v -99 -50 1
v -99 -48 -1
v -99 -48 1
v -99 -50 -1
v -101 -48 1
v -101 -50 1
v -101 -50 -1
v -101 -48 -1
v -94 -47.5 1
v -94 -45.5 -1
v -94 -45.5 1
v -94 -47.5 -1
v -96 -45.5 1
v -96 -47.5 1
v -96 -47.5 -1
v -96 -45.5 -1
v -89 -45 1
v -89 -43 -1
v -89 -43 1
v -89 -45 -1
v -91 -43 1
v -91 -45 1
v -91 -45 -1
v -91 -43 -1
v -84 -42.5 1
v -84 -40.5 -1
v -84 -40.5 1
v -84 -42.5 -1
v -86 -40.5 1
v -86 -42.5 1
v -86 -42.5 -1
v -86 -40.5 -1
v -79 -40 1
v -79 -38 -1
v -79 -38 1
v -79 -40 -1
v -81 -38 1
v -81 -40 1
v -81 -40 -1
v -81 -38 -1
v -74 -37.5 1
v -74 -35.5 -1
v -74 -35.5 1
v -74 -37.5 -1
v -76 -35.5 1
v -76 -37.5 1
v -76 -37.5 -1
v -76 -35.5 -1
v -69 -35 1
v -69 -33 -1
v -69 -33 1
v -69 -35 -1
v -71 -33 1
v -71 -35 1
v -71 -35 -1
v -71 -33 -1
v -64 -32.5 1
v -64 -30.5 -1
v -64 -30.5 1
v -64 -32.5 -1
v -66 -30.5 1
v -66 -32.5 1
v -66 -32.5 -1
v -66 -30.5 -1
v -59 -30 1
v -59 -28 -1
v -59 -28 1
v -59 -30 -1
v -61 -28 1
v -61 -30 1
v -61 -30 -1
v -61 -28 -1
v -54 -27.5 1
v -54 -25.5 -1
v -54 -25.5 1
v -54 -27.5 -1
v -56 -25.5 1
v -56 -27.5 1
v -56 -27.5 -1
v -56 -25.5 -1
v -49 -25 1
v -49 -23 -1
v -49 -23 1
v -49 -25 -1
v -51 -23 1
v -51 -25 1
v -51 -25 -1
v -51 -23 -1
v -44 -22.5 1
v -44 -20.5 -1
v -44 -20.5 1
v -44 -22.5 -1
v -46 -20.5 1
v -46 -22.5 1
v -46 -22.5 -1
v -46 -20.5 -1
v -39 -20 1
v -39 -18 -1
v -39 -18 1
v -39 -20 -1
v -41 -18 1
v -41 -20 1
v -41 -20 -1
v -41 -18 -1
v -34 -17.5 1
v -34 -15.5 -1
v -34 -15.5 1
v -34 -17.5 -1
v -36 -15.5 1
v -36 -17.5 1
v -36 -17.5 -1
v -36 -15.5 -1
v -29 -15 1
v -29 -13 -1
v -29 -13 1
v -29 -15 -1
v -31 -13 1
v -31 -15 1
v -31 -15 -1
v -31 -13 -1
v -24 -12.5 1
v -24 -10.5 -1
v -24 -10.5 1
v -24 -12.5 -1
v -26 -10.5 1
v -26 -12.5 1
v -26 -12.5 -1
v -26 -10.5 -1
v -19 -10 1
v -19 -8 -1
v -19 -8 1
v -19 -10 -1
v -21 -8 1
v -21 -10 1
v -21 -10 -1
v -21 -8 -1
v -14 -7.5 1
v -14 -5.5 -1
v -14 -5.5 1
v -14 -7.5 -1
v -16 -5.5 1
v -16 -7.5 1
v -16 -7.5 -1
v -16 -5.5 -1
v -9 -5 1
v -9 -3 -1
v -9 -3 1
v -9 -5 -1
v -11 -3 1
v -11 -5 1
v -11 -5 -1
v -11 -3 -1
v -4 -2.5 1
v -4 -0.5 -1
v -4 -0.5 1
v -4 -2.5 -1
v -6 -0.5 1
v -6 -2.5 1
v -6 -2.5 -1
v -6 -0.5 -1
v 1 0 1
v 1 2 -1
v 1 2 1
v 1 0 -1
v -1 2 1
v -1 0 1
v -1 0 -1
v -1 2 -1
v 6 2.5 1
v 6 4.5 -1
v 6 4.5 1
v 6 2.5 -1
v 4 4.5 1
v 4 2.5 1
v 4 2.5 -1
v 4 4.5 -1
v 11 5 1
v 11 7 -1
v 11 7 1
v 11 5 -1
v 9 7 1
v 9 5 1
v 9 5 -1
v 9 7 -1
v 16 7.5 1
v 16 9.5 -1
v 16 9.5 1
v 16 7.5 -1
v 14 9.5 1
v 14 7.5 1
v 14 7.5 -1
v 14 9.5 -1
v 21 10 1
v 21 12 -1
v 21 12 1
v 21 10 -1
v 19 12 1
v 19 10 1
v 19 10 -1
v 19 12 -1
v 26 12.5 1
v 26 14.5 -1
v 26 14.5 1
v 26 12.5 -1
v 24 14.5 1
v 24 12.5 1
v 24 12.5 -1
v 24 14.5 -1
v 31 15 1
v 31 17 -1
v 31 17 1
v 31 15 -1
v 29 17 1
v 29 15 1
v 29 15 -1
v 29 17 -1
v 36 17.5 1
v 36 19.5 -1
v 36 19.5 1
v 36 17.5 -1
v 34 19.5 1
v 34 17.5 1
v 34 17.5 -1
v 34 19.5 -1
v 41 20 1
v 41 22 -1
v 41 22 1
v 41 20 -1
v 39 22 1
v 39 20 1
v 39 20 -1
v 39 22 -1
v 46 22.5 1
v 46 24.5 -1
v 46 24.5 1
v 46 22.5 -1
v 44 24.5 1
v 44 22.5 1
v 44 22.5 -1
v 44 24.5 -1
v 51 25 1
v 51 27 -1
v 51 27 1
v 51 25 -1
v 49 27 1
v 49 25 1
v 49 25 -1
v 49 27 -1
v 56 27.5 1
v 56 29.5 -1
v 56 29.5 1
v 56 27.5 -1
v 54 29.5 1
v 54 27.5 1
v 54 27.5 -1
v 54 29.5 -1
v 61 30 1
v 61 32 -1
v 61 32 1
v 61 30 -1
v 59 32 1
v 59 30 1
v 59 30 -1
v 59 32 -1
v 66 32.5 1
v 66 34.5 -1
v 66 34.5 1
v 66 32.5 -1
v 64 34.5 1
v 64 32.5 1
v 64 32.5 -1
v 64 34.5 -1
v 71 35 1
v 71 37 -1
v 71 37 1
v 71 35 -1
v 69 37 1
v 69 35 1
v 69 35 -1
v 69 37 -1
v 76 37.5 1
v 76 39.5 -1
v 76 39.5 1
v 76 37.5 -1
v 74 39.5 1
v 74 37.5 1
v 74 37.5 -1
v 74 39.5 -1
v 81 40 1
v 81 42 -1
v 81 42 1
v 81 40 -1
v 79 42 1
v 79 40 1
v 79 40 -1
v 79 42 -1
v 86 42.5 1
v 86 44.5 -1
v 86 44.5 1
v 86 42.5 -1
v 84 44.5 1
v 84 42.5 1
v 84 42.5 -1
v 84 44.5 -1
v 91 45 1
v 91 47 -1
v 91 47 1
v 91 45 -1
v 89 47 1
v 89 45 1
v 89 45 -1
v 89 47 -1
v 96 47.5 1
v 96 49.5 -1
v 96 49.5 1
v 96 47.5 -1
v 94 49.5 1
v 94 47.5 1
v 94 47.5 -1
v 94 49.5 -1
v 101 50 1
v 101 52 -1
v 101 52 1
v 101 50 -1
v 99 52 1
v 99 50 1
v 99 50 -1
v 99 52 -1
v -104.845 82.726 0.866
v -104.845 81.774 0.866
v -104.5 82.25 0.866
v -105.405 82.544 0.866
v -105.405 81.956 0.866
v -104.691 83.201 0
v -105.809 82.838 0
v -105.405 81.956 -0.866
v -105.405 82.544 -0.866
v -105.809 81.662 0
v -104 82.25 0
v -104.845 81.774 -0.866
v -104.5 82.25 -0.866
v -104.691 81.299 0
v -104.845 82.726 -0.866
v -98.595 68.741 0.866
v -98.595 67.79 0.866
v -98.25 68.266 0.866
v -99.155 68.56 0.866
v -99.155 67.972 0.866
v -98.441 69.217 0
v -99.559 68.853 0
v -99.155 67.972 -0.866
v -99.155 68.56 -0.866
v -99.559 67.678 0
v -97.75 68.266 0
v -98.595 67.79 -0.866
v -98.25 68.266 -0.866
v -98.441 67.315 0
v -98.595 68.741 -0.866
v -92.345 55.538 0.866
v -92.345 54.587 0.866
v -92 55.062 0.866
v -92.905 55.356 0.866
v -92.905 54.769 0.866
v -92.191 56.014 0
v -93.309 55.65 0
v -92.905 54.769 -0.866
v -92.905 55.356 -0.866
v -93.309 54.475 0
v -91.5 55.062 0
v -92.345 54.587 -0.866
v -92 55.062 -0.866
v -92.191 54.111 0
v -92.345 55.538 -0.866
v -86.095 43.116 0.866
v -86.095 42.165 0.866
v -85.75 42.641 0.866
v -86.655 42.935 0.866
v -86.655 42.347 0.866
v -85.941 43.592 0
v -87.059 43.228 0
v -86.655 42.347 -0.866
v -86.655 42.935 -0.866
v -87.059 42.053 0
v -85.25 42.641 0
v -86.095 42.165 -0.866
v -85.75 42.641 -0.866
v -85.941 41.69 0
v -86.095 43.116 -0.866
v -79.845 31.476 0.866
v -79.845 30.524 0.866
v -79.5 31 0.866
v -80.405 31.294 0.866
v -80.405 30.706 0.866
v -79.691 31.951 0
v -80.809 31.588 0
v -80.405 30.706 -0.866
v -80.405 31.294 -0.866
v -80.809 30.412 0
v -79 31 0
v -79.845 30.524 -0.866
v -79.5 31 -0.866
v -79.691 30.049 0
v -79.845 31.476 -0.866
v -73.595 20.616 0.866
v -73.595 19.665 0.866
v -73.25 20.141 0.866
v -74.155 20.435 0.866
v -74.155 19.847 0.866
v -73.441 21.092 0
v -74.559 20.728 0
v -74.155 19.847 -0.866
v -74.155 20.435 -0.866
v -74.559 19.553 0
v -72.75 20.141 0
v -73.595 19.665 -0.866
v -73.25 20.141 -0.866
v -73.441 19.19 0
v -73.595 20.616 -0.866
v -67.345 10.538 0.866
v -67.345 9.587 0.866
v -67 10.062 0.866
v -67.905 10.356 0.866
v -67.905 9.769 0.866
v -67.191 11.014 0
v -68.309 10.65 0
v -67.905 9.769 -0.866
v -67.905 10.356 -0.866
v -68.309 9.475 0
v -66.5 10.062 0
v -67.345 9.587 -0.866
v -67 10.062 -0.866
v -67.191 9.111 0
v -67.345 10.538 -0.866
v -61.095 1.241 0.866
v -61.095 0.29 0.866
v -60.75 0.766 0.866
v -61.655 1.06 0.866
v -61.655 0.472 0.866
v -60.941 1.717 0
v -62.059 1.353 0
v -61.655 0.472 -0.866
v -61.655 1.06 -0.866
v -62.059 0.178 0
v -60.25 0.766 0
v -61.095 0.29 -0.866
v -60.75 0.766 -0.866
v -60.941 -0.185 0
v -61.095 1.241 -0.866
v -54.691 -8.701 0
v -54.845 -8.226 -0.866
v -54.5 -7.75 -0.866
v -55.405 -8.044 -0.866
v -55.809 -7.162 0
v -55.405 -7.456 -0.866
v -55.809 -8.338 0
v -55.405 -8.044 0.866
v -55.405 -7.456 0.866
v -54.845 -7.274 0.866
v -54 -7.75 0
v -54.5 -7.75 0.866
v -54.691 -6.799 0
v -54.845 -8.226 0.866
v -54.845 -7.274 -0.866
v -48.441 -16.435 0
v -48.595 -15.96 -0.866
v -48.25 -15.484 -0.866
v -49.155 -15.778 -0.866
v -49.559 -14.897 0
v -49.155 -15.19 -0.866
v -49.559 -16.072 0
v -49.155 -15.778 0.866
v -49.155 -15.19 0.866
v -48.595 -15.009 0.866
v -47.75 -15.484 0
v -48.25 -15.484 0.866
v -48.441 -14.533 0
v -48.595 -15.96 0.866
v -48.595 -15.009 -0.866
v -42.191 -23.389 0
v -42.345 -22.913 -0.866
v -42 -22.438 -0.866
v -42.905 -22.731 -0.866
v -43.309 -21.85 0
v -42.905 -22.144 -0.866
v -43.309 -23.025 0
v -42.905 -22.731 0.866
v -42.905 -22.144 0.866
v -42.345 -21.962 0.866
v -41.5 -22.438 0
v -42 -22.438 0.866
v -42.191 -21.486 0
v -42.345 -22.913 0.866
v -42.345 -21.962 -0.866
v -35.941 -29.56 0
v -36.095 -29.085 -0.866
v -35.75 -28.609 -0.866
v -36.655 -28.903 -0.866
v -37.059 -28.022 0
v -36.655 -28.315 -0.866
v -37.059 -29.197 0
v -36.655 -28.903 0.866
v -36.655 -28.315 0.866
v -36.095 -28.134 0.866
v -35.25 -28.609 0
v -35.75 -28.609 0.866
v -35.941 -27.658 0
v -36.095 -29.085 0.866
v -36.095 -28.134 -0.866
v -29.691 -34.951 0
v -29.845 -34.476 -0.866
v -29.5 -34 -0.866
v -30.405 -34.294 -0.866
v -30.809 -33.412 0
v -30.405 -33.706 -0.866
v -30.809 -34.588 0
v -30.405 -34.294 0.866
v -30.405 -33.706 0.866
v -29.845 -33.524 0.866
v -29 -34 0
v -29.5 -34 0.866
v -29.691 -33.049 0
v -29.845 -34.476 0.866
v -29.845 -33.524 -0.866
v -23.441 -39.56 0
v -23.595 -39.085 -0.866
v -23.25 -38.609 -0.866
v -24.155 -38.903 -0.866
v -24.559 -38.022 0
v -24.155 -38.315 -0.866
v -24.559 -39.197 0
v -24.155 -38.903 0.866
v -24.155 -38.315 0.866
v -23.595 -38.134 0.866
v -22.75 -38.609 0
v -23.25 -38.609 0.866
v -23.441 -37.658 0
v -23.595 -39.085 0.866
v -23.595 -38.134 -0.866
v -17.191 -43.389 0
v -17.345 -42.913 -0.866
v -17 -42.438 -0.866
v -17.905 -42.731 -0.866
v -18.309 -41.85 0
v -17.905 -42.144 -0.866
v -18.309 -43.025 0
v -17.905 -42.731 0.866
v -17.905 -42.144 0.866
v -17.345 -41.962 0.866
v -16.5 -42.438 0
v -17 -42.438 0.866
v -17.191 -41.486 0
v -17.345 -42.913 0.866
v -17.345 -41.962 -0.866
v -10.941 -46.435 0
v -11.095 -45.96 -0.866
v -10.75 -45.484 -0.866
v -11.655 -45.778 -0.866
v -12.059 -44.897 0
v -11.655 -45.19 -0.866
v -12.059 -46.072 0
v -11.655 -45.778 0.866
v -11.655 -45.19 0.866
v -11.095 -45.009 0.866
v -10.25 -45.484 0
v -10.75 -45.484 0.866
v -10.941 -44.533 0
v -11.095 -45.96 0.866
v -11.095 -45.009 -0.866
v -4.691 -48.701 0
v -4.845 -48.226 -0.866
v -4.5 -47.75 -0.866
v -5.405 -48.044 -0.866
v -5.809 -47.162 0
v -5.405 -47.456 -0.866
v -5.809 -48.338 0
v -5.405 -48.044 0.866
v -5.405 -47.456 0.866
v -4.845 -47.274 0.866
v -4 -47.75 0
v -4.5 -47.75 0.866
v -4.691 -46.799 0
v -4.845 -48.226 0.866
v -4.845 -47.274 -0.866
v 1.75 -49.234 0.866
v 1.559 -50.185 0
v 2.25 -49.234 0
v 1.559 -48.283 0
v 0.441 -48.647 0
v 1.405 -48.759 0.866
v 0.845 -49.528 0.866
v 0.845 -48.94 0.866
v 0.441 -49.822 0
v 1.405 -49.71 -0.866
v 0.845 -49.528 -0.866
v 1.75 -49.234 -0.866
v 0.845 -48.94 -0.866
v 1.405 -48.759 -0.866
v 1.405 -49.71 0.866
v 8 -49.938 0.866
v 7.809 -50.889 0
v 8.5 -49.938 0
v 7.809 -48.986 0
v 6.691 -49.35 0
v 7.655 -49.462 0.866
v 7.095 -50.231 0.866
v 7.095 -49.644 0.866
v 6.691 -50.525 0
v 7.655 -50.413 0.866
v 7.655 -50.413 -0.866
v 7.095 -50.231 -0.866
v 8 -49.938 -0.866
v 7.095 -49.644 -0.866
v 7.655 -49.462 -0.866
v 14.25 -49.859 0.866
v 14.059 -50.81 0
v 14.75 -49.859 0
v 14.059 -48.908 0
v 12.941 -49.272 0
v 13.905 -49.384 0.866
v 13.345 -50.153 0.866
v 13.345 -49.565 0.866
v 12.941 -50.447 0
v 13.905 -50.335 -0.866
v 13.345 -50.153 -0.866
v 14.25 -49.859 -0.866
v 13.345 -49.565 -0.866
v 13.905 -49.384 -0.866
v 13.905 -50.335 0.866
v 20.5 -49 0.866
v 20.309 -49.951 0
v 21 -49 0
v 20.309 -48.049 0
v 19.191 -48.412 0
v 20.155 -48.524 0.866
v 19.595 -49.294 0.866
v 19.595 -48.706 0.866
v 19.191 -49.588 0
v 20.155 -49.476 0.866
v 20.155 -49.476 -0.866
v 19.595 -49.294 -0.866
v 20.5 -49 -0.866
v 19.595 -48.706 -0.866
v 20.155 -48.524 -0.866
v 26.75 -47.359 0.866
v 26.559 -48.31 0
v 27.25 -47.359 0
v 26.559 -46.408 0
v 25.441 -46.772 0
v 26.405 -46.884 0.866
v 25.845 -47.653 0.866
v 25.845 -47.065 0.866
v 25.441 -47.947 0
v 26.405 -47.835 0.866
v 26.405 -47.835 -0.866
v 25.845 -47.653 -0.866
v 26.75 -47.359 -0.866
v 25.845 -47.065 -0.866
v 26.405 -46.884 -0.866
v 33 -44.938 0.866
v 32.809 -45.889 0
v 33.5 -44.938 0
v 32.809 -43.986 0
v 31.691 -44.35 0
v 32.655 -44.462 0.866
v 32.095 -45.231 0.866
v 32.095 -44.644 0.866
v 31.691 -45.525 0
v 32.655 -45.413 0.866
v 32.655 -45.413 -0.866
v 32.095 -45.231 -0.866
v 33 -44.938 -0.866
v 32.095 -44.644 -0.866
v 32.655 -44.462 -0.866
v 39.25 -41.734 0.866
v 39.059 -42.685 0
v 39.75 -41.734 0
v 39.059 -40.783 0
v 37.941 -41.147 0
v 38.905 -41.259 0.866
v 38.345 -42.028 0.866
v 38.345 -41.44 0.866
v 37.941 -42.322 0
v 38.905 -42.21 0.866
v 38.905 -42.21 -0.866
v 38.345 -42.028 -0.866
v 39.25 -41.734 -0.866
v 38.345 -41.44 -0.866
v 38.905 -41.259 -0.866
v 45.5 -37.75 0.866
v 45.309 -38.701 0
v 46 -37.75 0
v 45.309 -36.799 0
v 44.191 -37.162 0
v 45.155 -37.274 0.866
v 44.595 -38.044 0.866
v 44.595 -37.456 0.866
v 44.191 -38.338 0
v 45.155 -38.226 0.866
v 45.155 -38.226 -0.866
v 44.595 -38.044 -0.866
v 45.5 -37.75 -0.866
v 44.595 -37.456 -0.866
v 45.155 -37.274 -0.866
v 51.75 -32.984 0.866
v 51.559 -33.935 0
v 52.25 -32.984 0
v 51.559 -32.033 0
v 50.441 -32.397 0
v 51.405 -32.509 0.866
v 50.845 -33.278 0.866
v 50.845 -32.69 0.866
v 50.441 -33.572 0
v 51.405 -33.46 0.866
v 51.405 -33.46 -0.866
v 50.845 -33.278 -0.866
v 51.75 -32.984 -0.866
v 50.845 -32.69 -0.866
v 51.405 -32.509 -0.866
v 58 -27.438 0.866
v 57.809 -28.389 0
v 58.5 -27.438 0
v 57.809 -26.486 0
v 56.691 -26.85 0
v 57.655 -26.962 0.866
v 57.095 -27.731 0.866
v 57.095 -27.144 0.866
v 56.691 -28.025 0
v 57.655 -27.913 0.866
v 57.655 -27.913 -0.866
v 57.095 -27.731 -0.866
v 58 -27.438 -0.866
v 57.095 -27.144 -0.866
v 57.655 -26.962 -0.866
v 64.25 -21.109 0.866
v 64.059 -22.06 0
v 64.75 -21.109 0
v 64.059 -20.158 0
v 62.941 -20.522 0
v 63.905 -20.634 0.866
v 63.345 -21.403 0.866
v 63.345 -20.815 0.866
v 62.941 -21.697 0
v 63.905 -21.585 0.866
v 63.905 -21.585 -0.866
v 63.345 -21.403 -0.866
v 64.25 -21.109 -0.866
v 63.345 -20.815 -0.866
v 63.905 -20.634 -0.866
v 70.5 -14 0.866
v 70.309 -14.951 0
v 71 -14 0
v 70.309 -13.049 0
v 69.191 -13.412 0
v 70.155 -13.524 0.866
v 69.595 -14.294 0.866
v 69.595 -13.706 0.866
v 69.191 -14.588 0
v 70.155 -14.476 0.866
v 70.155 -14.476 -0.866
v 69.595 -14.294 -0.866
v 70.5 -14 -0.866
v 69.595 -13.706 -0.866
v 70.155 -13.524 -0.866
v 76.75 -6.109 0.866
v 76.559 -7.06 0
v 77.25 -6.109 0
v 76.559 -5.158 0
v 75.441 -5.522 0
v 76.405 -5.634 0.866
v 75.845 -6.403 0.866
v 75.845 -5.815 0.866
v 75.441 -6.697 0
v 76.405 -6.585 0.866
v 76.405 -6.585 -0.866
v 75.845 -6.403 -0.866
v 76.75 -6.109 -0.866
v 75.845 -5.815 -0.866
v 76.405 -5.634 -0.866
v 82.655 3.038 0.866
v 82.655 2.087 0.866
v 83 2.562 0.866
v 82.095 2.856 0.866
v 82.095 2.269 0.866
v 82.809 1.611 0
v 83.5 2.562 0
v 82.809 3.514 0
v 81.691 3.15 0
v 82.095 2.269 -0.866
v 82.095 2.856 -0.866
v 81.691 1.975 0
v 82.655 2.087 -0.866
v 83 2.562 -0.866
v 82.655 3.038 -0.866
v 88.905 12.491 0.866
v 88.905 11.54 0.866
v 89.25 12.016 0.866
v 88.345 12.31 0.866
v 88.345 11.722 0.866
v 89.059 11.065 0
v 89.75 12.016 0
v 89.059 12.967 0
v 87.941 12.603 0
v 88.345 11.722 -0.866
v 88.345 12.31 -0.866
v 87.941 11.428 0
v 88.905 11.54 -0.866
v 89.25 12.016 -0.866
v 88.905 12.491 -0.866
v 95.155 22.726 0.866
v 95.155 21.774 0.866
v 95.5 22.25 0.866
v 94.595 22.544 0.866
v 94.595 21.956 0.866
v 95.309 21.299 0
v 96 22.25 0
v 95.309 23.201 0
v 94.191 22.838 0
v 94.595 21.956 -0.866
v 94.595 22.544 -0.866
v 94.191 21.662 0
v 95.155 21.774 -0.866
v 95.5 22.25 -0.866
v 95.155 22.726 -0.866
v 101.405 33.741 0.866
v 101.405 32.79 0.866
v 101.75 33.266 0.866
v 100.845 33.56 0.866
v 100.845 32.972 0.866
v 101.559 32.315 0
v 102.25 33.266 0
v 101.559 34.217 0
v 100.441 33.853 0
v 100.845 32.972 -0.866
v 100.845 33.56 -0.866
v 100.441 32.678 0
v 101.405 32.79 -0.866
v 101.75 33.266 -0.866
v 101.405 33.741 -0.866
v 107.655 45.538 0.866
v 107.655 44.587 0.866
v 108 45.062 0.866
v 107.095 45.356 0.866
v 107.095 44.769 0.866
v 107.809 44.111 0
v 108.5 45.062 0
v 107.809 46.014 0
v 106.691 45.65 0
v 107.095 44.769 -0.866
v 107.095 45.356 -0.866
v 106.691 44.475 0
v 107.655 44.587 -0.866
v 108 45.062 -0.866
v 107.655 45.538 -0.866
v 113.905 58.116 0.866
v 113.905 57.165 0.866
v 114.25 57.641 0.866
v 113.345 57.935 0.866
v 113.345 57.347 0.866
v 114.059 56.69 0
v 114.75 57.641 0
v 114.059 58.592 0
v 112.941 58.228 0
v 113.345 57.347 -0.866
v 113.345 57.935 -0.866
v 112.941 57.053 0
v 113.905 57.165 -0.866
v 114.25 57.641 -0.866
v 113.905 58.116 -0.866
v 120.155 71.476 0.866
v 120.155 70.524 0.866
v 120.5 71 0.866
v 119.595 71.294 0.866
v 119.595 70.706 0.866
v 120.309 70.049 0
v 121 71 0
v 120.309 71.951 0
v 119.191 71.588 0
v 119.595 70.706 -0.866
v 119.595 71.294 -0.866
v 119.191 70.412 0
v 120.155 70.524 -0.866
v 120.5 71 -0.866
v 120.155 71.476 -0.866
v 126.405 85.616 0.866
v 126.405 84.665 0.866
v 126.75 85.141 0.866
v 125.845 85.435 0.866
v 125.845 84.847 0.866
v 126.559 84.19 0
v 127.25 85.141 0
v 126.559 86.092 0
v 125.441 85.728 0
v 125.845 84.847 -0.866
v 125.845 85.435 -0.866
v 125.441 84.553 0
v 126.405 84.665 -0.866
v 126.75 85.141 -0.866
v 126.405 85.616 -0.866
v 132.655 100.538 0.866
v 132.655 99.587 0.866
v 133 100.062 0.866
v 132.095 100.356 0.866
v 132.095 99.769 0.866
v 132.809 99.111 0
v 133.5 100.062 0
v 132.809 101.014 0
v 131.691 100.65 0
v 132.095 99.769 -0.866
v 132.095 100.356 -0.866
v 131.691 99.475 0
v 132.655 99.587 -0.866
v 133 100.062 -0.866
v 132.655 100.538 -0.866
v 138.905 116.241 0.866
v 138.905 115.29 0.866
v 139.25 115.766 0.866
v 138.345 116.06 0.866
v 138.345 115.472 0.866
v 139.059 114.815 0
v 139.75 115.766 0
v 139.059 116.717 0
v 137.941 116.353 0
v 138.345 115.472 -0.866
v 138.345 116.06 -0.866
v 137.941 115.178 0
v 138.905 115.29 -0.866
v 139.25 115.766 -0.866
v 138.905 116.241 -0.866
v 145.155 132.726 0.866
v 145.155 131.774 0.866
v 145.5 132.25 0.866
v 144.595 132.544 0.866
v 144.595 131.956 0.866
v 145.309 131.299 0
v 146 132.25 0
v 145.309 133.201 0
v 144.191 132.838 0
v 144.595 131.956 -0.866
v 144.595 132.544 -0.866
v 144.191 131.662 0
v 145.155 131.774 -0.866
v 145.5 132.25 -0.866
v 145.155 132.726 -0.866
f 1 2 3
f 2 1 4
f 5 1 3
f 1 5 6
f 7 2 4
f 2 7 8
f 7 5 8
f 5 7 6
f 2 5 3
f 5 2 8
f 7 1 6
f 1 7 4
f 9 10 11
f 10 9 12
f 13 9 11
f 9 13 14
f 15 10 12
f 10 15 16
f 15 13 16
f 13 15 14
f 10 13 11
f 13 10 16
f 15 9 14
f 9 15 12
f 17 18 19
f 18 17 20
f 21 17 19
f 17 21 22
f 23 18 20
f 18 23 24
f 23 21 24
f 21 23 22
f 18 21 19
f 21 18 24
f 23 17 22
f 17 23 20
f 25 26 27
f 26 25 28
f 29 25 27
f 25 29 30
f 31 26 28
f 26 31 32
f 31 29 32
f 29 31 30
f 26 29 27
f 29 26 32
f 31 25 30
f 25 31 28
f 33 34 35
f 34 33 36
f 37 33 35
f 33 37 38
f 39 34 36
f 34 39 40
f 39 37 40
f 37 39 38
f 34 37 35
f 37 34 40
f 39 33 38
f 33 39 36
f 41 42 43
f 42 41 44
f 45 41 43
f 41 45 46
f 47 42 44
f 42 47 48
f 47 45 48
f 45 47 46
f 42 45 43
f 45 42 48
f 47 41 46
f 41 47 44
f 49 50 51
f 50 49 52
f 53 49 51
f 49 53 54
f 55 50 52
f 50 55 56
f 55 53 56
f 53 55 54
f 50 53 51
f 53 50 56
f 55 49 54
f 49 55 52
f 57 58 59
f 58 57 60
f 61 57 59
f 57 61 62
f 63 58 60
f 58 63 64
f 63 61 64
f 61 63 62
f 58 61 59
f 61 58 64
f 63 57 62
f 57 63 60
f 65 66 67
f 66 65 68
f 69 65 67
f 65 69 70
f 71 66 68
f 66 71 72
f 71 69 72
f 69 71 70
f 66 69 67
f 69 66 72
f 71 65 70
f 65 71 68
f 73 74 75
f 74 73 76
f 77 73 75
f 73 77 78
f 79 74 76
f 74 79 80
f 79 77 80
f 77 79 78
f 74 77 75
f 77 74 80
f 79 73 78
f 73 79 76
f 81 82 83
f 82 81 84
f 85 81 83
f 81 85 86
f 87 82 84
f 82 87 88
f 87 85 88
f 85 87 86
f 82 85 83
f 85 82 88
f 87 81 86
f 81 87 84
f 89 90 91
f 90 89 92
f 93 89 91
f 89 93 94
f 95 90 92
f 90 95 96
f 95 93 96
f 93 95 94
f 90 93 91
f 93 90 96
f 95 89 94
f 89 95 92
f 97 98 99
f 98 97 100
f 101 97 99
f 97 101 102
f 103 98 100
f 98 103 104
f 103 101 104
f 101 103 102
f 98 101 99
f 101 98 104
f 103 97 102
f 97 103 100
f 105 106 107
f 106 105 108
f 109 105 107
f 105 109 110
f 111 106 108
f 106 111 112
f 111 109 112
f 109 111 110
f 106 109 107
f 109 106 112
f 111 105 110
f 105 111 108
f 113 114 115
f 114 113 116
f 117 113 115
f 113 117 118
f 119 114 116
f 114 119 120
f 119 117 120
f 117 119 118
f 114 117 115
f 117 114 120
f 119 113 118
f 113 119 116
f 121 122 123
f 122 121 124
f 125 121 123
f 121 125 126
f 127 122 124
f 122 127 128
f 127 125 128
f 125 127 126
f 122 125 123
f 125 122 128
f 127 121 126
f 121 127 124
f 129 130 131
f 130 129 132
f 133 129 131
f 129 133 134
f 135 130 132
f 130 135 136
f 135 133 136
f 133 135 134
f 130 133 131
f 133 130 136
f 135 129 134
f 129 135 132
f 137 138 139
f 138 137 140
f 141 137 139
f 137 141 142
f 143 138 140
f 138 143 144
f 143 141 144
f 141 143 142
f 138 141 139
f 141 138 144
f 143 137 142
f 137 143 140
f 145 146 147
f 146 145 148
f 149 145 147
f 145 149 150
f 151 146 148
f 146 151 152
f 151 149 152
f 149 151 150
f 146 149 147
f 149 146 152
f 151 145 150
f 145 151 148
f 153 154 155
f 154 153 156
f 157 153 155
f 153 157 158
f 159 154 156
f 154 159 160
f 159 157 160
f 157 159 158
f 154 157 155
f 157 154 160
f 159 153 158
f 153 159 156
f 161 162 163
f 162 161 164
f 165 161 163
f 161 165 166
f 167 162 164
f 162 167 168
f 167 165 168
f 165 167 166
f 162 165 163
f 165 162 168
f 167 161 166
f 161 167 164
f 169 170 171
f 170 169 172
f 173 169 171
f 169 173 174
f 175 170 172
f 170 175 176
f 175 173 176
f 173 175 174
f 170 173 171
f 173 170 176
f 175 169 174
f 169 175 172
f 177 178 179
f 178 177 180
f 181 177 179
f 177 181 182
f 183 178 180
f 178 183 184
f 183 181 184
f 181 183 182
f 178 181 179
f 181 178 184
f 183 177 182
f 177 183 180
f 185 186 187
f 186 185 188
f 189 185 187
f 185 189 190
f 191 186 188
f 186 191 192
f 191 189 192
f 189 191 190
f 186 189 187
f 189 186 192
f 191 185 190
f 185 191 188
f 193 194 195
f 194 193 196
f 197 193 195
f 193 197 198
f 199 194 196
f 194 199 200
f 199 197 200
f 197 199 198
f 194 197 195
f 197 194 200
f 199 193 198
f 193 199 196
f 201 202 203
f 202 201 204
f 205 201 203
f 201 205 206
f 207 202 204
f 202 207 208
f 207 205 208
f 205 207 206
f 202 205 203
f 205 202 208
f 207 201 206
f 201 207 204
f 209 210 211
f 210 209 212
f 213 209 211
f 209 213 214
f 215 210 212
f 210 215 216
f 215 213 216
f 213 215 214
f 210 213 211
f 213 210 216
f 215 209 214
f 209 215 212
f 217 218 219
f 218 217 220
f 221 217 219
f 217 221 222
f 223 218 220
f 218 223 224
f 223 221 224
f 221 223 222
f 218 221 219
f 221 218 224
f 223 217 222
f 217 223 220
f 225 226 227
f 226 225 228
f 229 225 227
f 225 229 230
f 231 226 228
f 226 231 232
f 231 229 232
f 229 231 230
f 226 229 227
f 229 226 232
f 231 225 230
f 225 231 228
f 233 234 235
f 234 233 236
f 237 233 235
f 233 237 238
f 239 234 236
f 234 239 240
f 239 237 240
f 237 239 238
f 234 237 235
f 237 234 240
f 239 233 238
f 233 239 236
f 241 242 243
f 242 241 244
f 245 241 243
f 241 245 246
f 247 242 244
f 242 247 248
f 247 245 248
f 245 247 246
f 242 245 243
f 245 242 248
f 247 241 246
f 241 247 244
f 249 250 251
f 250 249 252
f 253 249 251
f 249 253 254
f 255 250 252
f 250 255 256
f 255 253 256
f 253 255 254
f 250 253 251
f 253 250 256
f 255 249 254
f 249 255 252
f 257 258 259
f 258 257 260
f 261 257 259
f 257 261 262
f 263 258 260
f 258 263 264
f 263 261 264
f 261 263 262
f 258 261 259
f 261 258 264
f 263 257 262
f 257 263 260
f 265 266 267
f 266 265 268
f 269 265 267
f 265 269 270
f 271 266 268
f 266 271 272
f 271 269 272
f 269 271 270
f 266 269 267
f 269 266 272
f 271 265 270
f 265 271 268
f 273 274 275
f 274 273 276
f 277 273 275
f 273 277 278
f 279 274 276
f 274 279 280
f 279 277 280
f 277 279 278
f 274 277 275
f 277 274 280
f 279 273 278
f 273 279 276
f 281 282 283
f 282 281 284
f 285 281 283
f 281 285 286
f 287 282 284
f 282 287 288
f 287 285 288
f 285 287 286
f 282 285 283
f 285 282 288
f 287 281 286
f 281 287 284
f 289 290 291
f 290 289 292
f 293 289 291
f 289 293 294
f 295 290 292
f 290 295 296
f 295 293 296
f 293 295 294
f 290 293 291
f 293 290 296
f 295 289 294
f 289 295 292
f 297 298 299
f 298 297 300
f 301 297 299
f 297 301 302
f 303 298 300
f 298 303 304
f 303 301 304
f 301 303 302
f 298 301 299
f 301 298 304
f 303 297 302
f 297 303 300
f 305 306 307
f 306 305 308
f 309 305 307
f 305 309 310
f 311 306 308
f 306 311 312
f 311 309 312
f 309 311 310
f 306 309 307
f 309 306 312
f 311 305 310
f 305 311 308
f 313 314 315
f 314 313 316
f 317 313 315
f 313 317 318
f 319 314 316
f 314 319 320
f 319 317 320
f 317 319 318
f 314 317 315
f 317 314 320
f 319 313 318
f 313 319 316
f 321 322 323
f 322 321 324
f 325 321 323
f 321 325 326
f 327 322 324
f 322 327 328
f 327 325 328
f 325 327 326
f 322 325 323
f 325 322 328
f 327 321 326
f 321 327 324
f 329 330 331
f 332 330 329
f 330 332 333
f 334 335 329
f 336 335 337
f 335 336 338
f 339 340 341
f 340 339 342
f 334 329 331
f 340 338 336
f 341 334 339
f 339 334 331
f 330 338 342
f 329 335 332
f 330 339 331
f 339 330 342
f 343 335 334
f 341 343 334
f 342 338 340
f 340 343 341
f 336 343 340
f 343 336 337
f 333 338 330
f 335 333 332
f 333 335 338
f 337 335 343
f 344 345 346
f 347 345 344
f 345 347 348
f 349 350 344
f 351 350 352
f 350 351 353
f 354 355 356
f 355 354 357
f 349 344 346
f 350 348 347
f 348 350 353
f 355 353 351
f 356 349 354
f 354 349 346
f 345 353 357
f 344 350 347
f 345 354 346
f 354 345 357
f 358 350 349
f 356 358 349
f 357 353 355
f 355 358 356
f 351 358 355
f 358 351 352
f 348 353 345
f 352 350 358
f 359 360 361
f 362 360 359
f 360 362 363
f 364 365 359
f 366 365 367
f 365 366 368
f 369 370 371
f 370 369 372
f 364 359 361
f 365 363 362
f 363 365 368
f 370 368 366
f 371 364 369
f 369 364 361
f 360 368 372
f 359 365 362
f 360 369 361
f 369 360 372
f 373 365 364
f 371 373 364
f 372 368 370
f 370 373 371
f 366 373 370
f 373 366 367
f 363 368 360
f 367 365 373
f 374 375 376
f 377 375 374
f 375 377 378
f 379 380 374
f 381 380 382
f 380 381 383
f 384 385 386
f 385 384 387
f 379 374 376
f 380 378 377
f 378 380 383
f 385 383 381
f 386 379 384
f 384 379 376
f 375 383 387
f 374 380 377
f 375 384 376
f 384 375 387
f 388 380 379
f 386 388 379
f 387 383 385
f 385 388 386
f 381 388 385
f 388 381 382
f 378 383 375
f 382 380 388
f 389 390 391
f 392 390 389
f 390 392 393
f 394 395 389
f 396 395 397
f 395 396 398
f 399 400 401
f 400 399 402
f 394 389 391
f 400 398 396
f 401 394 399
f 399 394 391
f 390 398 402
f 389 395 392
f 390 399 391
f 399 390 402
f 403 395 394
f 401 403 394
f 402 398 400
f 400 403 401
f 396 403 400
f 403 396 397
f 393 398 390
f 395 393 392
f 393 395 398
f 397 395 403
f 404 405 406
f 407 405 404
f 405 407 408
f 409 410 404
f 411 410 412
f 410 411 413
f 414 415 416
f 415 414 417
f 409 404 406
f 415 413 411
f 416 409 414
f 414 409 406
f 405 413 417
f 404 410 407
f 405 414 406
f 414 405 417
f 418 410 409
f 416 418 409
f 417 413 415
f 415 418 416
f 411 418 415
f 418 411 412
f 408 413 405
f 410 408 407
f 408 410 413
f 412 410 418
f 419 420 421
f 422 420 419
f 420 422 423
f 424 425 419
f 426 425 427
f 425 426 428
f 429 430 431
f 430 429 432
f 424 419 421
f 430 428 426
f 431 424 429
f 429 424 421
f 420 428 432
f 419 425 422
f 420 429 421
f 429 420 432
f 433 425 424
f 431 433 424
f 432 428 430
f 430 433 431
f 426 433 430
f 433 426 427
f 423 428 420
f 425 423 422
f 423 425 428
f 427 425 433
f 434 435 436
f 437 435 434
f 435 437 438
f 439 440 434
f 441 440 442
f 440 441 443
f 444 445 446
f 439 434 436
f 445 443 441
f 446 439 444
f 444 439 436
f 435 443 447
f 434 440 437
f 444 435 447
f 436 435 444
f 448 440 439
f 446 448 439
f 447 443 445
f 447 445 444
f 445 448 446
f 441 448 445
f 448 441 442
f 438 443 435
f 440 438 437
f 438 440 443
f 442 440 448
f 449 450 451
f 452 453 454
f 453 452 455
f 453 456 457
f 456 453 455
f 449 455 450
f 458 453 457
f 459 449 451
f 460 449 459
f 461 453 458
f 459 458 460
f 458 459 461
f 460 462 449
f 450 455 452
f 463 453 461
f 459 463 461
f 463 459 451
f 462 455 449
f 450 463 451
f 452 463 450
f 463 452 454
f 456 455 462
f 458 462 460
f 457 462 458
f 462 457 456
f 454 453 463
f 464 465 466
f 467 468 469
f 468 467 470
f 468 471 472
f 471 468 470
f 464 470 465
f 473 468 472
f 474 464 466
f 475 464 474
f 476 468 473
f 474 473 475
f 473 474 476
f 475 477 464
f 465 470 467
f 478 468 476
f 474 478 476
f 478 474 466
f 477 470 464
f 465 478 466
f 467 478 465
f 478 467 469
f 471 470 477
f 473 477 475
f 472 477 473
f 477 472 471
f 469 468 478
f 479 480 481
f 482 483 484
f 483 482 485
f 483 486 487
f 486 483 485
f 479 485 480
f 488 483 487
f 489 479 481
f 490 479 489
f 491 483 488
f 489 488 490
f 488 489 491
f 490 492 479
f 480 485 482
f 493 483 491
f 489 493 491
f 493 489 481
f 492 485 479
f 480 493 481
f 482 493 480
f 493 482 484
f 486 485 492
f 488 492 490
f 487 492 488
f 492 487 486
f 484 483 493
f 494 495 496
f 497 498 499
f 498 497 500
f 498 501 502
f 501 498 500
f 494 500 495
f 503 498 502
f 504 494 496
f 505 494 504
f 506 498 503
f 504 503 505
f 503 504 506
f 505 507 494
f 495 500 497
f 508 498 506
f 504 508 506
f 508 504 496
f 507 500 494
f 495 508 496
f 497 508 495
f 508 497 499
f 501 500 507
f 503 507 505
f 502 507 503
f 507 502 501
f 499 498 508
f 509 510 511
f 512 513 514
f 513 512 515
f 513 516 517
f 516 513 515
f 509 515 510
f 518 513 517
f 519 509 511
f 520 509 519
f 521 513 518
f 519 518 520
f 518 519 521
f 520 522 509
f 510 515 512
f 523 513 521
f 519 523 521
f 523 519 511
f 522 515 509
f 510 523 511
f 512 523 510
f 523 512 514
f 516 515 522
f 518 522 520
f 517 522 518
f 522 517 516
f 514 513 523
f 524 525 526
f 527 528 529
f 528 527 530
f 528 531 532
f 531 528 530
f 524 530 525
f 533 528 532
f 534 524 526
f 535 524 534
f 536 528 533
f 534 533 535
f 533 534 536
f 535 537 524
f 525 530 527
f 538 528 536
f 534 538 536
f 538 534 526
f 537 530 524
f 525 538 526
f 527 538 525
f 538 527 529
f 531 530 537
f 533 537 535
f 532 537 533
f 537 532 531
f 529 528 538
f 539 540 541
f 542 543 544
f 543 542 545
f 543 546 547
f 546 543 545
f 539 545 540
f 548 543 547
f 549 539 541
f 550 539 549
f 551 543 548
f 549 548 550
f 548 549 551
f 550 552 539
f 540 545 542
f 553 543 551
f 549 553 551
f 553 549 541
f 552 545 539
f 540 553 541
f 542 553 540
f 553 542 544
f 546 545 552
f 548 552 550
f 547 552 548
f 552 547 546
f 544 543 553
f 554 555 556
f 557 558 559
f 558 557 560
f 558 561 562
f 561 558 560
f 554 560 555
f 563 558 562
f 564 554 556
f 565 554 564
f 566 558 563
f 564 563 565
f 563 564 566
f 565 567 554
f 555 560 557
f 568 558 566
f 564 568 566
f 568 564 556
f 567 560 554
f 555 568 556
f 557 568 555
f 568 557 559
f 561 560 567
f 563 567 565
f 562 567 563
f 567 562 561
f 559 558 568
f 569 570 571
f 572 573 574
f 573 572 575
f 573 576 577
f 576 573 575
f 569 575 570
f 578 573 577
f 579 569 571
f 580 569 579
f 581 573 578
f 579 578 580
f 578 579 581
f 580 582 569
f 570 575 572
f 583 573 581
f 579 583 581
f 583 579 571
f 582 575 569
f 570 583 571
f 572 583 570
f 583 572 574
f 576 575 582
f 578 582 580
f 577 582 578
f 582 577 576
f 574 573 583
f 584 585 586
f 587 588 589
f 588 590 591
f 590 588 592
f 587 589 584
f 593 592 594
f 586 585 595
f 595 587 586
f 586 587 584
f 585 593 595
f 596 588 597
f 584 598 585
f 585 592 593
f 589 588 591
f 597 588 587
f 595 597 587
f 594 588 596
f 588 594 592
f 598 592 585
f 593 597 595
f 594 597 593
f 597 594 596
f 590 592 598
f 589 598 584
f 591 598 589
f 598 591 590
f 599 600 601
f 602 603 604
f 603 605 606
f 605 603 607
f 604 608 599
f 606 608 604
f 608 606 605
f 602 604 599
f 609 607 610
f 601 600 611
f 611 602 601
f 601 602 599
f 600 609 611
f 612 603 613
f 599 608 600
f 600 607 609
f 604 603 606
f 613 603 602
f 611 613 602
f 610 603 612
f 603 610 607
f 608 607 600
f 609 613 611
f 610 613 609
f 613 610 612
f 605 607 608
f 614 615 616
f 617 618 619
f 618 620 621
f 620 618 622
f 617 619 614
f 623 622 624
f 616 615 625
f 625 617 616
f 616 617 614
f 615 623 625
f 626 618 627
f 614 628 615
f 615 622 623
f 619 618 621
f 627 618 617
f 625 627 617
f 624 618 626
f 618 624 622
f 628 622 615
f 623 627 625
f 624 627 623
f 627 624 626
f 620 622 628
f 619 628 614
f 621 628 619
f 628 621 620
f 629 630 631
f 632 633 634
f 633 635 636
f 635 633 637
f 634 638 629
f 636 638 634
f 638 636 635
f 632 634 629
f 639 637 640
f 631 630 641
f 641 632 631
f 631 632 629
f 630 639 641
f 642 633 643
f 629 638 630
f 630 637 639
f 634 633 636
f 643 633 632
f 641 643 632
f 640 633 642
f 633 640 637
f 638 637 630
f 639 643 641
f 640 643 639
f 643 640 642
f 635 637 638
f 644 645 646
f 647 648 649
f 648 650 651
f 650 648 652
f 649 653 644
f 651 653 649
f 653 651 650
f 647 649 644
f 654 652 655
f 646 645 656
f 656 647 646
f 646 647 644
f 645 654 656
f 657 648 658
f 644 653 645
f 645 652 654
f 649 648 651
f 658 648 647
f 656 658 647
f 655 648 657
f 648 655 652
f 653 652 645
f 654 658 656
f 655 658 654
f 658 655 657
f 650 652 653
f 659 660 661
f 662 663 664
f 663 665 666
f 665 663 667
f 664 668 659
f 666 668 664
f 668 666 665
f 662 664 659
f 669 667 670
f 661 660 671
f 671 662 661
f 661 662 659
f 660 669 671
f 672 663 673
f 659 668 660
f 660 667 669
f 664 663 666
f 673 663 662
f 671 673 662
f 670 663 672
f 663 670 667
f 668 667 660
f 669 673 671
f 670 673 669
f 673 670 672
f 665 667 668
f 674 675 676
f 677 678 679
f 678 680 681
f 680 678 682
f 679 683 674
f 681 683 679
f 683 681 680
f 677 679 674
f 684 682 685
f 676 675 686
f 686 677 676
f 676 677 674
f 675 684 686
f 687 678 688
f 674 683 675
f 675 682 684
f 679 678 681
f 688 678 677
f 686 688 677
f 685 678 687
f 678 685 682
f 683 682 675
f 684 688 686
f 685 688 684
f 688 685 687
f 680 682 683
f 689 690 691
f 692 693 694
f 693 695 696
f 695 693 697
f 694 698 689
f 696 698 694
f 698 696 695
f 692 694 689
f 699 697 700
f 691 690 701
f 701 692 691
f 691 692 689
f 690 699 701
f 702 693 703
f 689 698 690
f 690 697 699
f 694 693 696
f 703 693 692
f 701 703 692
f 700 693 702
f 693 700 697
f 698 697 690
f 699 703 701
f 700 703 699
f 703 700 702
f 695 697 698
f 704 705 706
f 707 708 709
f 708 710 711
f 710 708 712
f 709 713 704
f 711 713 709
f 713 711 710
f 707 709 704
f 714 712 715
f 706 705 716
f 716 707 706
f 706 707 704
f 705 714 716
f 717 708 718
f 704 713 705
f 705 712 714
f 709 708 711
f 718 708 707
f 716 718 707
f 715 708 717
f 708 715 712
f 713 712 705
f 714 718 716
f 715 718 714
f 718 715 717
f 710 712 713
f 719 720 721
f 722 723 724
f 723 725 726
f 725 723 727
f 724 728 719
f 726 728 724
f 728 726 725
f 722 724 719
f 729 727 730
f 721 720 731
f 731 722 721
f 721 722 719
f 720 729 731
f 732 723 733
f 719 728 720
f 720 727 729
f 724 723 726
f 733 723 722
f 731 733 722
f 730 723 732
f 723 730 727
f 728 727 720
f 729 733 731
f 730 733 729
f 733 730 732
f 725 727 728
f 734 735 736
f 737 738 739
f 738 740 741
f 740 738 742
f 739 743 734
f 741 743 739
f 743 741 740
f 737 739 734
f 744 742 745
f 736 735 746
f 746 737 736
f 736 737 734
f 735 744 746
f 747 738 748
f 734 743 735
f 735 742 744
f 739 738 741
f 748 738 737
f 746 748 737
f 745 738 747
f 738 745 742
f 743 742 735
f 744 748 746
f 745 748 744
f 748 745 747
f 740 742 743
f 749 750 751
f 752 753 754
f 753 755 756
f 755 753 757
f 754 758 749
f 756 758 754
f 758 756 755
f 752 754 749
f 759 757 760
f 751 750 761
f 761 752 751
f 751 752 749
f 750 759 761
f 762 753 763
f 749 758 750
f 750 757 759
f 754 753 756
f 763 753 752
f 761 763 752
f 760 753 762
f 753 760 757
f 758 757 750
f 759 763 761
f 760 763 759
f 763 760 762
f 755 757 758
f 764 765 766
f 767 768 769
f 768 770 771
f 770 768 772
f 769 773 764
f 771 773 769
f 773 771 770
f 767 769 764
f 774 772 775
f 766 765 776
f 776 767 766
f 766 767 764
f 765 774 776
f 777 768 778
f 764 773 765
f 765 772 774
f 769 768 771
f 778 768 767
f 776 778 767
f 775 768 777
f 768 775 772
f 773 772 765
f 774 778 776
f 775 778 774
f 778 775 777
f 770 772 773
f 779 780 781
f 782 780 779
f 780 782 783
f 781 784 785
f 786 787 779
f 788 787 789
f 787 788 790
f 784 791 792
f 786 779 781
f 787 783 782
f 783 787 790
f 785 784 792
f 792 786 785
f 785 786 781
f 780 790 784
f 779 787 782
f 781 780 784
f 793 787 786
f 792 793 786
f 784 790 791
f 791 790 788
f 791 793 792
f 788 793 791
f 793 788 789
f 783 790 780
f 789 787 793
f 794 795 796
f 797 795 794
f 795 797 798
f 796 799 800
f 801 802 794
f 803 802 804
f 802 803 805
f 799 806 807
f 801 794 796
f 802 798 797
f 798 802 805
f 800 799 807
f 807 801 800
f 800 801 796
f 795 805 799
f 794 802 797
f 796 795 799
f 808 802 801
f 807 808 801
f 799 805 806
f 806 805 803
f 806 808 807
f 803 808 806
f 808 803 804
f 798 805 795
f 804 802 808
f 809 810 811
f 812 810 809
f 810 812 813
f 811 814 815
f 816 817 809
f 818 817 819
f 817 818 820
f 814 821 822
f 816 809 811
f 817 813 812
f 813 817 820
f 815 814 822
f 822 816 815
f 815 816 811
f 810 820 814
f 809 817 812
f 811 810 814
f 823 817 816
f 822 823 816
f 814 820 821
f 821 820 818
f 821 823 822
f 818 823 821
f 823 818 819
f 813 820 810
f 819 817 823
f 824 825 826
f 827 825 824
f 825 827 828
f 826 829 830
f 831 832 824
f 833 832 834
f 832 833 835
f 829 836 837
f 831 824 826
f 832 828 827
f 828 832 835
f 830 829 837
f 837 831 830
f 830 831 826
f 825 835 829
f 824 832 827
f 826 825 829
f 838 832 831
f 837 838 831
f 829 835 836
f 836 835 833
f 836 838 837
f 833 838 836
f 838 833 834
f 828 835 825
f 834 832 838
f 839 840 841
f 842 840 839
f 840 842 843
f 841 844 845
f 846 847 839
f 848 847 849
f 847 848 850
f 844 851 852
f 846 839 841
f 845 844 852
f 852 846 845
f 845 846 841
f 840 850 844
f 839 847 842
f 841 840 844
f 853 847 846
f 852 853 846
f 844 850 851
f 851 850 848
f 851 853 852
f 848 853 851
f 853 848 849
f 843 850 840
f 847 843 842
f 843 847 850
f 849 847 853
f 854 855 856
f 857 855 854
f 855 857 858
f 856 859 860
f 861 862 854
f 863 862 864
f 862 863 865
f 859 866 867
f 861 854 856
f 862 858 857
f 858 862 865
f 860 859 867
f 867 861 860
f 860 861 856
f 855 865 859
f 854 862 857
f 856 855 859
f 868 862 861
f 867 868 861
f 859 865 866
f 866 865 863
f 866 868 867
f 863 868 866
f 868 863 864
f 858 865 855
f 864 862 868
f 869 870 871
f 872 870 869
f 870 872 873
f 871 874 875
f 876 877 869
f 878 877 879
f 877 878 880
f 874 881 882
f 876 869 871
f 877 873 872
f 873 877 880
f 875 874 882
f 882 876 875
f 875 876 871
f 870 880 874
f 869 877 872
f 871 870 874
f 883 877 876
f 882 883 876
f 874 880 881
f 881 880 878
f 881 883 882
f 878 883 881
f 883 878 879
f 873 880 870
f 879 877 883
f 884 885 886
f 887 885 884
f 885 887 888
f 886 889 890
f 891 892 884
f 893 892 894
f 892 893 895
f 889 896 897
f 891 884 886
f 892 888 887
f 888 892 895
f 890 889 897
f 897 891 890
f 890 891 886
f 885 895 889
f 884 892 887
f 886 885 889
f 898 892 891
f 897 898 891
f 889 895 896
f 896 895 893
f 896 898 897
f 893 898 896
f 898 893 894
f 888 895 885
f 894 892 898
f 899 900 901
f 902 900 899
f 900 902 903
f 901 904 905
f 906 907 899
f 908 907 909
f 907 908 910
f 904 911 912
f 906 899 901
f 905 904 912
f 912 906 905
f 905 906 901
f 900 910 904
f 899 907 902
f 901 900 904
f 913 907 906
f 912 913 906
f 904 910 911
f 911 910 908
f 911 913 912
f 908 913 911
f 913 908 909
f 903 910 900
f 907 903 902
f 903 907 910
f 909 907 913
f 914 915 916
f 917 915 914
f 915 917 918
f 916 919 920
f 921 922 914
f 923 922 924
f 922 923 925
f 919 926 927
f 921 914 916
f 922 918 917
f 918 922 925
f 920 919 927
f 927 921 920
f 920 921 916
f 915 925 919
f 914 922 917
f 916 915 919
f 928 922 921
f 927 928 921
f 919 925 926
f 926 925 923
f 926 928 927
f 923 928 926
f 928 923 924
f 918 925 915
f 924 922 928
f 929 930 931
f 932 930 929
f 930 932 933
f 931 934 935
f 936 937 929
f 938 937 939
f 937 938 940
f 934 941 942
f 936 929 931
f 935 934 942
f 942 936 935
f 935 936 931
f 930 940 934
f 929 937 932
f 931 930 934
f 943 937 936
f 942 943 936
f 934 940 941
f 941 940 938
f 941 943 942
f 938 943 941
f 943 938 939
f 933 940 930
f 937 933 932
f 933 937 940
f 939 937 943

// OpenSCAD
echo(version=version());

// Functions can be defined to simplify code using lots of
// calculations.

// Simple example with a single function argument (which should
// be a number) and returning a number calculated based on that.
function f(x) = 0.5 * x + 1;

color("red")
    for (a = [ -100 : 5 : 100 ])
        translate([a, f(a), 0]) cube(2, center = true);

// Functions can call other functions and return complex values
// too. In this case a 3 element vector is returned which can
// be used as point in 3D space or as vector (in the mathematical
// meaning) for translations and other transformations.
function g(x) = [ 5 * x + 20, f(x) * f(x) - 50, 0 ];

color("green")
    for (a = [ -200 : 10 : 200 ])
        translate(g(a / 8)) sphere(1);



// Written in 2015 by Torsten Paul <Torsten.Paul@gmx.de>
//
// To the extent possible under law, the author(s) have dedicated all
// copyright and related and neighboring rights to this software to the
// public domain worldwide. This software is distributed without any
// warranty.
//
// You should have received a copy of the CC0 Public Domain
// Dedication along with this software.
// If not, see <http://creativecommons.org/publicdomain/zero/1.0/>.
